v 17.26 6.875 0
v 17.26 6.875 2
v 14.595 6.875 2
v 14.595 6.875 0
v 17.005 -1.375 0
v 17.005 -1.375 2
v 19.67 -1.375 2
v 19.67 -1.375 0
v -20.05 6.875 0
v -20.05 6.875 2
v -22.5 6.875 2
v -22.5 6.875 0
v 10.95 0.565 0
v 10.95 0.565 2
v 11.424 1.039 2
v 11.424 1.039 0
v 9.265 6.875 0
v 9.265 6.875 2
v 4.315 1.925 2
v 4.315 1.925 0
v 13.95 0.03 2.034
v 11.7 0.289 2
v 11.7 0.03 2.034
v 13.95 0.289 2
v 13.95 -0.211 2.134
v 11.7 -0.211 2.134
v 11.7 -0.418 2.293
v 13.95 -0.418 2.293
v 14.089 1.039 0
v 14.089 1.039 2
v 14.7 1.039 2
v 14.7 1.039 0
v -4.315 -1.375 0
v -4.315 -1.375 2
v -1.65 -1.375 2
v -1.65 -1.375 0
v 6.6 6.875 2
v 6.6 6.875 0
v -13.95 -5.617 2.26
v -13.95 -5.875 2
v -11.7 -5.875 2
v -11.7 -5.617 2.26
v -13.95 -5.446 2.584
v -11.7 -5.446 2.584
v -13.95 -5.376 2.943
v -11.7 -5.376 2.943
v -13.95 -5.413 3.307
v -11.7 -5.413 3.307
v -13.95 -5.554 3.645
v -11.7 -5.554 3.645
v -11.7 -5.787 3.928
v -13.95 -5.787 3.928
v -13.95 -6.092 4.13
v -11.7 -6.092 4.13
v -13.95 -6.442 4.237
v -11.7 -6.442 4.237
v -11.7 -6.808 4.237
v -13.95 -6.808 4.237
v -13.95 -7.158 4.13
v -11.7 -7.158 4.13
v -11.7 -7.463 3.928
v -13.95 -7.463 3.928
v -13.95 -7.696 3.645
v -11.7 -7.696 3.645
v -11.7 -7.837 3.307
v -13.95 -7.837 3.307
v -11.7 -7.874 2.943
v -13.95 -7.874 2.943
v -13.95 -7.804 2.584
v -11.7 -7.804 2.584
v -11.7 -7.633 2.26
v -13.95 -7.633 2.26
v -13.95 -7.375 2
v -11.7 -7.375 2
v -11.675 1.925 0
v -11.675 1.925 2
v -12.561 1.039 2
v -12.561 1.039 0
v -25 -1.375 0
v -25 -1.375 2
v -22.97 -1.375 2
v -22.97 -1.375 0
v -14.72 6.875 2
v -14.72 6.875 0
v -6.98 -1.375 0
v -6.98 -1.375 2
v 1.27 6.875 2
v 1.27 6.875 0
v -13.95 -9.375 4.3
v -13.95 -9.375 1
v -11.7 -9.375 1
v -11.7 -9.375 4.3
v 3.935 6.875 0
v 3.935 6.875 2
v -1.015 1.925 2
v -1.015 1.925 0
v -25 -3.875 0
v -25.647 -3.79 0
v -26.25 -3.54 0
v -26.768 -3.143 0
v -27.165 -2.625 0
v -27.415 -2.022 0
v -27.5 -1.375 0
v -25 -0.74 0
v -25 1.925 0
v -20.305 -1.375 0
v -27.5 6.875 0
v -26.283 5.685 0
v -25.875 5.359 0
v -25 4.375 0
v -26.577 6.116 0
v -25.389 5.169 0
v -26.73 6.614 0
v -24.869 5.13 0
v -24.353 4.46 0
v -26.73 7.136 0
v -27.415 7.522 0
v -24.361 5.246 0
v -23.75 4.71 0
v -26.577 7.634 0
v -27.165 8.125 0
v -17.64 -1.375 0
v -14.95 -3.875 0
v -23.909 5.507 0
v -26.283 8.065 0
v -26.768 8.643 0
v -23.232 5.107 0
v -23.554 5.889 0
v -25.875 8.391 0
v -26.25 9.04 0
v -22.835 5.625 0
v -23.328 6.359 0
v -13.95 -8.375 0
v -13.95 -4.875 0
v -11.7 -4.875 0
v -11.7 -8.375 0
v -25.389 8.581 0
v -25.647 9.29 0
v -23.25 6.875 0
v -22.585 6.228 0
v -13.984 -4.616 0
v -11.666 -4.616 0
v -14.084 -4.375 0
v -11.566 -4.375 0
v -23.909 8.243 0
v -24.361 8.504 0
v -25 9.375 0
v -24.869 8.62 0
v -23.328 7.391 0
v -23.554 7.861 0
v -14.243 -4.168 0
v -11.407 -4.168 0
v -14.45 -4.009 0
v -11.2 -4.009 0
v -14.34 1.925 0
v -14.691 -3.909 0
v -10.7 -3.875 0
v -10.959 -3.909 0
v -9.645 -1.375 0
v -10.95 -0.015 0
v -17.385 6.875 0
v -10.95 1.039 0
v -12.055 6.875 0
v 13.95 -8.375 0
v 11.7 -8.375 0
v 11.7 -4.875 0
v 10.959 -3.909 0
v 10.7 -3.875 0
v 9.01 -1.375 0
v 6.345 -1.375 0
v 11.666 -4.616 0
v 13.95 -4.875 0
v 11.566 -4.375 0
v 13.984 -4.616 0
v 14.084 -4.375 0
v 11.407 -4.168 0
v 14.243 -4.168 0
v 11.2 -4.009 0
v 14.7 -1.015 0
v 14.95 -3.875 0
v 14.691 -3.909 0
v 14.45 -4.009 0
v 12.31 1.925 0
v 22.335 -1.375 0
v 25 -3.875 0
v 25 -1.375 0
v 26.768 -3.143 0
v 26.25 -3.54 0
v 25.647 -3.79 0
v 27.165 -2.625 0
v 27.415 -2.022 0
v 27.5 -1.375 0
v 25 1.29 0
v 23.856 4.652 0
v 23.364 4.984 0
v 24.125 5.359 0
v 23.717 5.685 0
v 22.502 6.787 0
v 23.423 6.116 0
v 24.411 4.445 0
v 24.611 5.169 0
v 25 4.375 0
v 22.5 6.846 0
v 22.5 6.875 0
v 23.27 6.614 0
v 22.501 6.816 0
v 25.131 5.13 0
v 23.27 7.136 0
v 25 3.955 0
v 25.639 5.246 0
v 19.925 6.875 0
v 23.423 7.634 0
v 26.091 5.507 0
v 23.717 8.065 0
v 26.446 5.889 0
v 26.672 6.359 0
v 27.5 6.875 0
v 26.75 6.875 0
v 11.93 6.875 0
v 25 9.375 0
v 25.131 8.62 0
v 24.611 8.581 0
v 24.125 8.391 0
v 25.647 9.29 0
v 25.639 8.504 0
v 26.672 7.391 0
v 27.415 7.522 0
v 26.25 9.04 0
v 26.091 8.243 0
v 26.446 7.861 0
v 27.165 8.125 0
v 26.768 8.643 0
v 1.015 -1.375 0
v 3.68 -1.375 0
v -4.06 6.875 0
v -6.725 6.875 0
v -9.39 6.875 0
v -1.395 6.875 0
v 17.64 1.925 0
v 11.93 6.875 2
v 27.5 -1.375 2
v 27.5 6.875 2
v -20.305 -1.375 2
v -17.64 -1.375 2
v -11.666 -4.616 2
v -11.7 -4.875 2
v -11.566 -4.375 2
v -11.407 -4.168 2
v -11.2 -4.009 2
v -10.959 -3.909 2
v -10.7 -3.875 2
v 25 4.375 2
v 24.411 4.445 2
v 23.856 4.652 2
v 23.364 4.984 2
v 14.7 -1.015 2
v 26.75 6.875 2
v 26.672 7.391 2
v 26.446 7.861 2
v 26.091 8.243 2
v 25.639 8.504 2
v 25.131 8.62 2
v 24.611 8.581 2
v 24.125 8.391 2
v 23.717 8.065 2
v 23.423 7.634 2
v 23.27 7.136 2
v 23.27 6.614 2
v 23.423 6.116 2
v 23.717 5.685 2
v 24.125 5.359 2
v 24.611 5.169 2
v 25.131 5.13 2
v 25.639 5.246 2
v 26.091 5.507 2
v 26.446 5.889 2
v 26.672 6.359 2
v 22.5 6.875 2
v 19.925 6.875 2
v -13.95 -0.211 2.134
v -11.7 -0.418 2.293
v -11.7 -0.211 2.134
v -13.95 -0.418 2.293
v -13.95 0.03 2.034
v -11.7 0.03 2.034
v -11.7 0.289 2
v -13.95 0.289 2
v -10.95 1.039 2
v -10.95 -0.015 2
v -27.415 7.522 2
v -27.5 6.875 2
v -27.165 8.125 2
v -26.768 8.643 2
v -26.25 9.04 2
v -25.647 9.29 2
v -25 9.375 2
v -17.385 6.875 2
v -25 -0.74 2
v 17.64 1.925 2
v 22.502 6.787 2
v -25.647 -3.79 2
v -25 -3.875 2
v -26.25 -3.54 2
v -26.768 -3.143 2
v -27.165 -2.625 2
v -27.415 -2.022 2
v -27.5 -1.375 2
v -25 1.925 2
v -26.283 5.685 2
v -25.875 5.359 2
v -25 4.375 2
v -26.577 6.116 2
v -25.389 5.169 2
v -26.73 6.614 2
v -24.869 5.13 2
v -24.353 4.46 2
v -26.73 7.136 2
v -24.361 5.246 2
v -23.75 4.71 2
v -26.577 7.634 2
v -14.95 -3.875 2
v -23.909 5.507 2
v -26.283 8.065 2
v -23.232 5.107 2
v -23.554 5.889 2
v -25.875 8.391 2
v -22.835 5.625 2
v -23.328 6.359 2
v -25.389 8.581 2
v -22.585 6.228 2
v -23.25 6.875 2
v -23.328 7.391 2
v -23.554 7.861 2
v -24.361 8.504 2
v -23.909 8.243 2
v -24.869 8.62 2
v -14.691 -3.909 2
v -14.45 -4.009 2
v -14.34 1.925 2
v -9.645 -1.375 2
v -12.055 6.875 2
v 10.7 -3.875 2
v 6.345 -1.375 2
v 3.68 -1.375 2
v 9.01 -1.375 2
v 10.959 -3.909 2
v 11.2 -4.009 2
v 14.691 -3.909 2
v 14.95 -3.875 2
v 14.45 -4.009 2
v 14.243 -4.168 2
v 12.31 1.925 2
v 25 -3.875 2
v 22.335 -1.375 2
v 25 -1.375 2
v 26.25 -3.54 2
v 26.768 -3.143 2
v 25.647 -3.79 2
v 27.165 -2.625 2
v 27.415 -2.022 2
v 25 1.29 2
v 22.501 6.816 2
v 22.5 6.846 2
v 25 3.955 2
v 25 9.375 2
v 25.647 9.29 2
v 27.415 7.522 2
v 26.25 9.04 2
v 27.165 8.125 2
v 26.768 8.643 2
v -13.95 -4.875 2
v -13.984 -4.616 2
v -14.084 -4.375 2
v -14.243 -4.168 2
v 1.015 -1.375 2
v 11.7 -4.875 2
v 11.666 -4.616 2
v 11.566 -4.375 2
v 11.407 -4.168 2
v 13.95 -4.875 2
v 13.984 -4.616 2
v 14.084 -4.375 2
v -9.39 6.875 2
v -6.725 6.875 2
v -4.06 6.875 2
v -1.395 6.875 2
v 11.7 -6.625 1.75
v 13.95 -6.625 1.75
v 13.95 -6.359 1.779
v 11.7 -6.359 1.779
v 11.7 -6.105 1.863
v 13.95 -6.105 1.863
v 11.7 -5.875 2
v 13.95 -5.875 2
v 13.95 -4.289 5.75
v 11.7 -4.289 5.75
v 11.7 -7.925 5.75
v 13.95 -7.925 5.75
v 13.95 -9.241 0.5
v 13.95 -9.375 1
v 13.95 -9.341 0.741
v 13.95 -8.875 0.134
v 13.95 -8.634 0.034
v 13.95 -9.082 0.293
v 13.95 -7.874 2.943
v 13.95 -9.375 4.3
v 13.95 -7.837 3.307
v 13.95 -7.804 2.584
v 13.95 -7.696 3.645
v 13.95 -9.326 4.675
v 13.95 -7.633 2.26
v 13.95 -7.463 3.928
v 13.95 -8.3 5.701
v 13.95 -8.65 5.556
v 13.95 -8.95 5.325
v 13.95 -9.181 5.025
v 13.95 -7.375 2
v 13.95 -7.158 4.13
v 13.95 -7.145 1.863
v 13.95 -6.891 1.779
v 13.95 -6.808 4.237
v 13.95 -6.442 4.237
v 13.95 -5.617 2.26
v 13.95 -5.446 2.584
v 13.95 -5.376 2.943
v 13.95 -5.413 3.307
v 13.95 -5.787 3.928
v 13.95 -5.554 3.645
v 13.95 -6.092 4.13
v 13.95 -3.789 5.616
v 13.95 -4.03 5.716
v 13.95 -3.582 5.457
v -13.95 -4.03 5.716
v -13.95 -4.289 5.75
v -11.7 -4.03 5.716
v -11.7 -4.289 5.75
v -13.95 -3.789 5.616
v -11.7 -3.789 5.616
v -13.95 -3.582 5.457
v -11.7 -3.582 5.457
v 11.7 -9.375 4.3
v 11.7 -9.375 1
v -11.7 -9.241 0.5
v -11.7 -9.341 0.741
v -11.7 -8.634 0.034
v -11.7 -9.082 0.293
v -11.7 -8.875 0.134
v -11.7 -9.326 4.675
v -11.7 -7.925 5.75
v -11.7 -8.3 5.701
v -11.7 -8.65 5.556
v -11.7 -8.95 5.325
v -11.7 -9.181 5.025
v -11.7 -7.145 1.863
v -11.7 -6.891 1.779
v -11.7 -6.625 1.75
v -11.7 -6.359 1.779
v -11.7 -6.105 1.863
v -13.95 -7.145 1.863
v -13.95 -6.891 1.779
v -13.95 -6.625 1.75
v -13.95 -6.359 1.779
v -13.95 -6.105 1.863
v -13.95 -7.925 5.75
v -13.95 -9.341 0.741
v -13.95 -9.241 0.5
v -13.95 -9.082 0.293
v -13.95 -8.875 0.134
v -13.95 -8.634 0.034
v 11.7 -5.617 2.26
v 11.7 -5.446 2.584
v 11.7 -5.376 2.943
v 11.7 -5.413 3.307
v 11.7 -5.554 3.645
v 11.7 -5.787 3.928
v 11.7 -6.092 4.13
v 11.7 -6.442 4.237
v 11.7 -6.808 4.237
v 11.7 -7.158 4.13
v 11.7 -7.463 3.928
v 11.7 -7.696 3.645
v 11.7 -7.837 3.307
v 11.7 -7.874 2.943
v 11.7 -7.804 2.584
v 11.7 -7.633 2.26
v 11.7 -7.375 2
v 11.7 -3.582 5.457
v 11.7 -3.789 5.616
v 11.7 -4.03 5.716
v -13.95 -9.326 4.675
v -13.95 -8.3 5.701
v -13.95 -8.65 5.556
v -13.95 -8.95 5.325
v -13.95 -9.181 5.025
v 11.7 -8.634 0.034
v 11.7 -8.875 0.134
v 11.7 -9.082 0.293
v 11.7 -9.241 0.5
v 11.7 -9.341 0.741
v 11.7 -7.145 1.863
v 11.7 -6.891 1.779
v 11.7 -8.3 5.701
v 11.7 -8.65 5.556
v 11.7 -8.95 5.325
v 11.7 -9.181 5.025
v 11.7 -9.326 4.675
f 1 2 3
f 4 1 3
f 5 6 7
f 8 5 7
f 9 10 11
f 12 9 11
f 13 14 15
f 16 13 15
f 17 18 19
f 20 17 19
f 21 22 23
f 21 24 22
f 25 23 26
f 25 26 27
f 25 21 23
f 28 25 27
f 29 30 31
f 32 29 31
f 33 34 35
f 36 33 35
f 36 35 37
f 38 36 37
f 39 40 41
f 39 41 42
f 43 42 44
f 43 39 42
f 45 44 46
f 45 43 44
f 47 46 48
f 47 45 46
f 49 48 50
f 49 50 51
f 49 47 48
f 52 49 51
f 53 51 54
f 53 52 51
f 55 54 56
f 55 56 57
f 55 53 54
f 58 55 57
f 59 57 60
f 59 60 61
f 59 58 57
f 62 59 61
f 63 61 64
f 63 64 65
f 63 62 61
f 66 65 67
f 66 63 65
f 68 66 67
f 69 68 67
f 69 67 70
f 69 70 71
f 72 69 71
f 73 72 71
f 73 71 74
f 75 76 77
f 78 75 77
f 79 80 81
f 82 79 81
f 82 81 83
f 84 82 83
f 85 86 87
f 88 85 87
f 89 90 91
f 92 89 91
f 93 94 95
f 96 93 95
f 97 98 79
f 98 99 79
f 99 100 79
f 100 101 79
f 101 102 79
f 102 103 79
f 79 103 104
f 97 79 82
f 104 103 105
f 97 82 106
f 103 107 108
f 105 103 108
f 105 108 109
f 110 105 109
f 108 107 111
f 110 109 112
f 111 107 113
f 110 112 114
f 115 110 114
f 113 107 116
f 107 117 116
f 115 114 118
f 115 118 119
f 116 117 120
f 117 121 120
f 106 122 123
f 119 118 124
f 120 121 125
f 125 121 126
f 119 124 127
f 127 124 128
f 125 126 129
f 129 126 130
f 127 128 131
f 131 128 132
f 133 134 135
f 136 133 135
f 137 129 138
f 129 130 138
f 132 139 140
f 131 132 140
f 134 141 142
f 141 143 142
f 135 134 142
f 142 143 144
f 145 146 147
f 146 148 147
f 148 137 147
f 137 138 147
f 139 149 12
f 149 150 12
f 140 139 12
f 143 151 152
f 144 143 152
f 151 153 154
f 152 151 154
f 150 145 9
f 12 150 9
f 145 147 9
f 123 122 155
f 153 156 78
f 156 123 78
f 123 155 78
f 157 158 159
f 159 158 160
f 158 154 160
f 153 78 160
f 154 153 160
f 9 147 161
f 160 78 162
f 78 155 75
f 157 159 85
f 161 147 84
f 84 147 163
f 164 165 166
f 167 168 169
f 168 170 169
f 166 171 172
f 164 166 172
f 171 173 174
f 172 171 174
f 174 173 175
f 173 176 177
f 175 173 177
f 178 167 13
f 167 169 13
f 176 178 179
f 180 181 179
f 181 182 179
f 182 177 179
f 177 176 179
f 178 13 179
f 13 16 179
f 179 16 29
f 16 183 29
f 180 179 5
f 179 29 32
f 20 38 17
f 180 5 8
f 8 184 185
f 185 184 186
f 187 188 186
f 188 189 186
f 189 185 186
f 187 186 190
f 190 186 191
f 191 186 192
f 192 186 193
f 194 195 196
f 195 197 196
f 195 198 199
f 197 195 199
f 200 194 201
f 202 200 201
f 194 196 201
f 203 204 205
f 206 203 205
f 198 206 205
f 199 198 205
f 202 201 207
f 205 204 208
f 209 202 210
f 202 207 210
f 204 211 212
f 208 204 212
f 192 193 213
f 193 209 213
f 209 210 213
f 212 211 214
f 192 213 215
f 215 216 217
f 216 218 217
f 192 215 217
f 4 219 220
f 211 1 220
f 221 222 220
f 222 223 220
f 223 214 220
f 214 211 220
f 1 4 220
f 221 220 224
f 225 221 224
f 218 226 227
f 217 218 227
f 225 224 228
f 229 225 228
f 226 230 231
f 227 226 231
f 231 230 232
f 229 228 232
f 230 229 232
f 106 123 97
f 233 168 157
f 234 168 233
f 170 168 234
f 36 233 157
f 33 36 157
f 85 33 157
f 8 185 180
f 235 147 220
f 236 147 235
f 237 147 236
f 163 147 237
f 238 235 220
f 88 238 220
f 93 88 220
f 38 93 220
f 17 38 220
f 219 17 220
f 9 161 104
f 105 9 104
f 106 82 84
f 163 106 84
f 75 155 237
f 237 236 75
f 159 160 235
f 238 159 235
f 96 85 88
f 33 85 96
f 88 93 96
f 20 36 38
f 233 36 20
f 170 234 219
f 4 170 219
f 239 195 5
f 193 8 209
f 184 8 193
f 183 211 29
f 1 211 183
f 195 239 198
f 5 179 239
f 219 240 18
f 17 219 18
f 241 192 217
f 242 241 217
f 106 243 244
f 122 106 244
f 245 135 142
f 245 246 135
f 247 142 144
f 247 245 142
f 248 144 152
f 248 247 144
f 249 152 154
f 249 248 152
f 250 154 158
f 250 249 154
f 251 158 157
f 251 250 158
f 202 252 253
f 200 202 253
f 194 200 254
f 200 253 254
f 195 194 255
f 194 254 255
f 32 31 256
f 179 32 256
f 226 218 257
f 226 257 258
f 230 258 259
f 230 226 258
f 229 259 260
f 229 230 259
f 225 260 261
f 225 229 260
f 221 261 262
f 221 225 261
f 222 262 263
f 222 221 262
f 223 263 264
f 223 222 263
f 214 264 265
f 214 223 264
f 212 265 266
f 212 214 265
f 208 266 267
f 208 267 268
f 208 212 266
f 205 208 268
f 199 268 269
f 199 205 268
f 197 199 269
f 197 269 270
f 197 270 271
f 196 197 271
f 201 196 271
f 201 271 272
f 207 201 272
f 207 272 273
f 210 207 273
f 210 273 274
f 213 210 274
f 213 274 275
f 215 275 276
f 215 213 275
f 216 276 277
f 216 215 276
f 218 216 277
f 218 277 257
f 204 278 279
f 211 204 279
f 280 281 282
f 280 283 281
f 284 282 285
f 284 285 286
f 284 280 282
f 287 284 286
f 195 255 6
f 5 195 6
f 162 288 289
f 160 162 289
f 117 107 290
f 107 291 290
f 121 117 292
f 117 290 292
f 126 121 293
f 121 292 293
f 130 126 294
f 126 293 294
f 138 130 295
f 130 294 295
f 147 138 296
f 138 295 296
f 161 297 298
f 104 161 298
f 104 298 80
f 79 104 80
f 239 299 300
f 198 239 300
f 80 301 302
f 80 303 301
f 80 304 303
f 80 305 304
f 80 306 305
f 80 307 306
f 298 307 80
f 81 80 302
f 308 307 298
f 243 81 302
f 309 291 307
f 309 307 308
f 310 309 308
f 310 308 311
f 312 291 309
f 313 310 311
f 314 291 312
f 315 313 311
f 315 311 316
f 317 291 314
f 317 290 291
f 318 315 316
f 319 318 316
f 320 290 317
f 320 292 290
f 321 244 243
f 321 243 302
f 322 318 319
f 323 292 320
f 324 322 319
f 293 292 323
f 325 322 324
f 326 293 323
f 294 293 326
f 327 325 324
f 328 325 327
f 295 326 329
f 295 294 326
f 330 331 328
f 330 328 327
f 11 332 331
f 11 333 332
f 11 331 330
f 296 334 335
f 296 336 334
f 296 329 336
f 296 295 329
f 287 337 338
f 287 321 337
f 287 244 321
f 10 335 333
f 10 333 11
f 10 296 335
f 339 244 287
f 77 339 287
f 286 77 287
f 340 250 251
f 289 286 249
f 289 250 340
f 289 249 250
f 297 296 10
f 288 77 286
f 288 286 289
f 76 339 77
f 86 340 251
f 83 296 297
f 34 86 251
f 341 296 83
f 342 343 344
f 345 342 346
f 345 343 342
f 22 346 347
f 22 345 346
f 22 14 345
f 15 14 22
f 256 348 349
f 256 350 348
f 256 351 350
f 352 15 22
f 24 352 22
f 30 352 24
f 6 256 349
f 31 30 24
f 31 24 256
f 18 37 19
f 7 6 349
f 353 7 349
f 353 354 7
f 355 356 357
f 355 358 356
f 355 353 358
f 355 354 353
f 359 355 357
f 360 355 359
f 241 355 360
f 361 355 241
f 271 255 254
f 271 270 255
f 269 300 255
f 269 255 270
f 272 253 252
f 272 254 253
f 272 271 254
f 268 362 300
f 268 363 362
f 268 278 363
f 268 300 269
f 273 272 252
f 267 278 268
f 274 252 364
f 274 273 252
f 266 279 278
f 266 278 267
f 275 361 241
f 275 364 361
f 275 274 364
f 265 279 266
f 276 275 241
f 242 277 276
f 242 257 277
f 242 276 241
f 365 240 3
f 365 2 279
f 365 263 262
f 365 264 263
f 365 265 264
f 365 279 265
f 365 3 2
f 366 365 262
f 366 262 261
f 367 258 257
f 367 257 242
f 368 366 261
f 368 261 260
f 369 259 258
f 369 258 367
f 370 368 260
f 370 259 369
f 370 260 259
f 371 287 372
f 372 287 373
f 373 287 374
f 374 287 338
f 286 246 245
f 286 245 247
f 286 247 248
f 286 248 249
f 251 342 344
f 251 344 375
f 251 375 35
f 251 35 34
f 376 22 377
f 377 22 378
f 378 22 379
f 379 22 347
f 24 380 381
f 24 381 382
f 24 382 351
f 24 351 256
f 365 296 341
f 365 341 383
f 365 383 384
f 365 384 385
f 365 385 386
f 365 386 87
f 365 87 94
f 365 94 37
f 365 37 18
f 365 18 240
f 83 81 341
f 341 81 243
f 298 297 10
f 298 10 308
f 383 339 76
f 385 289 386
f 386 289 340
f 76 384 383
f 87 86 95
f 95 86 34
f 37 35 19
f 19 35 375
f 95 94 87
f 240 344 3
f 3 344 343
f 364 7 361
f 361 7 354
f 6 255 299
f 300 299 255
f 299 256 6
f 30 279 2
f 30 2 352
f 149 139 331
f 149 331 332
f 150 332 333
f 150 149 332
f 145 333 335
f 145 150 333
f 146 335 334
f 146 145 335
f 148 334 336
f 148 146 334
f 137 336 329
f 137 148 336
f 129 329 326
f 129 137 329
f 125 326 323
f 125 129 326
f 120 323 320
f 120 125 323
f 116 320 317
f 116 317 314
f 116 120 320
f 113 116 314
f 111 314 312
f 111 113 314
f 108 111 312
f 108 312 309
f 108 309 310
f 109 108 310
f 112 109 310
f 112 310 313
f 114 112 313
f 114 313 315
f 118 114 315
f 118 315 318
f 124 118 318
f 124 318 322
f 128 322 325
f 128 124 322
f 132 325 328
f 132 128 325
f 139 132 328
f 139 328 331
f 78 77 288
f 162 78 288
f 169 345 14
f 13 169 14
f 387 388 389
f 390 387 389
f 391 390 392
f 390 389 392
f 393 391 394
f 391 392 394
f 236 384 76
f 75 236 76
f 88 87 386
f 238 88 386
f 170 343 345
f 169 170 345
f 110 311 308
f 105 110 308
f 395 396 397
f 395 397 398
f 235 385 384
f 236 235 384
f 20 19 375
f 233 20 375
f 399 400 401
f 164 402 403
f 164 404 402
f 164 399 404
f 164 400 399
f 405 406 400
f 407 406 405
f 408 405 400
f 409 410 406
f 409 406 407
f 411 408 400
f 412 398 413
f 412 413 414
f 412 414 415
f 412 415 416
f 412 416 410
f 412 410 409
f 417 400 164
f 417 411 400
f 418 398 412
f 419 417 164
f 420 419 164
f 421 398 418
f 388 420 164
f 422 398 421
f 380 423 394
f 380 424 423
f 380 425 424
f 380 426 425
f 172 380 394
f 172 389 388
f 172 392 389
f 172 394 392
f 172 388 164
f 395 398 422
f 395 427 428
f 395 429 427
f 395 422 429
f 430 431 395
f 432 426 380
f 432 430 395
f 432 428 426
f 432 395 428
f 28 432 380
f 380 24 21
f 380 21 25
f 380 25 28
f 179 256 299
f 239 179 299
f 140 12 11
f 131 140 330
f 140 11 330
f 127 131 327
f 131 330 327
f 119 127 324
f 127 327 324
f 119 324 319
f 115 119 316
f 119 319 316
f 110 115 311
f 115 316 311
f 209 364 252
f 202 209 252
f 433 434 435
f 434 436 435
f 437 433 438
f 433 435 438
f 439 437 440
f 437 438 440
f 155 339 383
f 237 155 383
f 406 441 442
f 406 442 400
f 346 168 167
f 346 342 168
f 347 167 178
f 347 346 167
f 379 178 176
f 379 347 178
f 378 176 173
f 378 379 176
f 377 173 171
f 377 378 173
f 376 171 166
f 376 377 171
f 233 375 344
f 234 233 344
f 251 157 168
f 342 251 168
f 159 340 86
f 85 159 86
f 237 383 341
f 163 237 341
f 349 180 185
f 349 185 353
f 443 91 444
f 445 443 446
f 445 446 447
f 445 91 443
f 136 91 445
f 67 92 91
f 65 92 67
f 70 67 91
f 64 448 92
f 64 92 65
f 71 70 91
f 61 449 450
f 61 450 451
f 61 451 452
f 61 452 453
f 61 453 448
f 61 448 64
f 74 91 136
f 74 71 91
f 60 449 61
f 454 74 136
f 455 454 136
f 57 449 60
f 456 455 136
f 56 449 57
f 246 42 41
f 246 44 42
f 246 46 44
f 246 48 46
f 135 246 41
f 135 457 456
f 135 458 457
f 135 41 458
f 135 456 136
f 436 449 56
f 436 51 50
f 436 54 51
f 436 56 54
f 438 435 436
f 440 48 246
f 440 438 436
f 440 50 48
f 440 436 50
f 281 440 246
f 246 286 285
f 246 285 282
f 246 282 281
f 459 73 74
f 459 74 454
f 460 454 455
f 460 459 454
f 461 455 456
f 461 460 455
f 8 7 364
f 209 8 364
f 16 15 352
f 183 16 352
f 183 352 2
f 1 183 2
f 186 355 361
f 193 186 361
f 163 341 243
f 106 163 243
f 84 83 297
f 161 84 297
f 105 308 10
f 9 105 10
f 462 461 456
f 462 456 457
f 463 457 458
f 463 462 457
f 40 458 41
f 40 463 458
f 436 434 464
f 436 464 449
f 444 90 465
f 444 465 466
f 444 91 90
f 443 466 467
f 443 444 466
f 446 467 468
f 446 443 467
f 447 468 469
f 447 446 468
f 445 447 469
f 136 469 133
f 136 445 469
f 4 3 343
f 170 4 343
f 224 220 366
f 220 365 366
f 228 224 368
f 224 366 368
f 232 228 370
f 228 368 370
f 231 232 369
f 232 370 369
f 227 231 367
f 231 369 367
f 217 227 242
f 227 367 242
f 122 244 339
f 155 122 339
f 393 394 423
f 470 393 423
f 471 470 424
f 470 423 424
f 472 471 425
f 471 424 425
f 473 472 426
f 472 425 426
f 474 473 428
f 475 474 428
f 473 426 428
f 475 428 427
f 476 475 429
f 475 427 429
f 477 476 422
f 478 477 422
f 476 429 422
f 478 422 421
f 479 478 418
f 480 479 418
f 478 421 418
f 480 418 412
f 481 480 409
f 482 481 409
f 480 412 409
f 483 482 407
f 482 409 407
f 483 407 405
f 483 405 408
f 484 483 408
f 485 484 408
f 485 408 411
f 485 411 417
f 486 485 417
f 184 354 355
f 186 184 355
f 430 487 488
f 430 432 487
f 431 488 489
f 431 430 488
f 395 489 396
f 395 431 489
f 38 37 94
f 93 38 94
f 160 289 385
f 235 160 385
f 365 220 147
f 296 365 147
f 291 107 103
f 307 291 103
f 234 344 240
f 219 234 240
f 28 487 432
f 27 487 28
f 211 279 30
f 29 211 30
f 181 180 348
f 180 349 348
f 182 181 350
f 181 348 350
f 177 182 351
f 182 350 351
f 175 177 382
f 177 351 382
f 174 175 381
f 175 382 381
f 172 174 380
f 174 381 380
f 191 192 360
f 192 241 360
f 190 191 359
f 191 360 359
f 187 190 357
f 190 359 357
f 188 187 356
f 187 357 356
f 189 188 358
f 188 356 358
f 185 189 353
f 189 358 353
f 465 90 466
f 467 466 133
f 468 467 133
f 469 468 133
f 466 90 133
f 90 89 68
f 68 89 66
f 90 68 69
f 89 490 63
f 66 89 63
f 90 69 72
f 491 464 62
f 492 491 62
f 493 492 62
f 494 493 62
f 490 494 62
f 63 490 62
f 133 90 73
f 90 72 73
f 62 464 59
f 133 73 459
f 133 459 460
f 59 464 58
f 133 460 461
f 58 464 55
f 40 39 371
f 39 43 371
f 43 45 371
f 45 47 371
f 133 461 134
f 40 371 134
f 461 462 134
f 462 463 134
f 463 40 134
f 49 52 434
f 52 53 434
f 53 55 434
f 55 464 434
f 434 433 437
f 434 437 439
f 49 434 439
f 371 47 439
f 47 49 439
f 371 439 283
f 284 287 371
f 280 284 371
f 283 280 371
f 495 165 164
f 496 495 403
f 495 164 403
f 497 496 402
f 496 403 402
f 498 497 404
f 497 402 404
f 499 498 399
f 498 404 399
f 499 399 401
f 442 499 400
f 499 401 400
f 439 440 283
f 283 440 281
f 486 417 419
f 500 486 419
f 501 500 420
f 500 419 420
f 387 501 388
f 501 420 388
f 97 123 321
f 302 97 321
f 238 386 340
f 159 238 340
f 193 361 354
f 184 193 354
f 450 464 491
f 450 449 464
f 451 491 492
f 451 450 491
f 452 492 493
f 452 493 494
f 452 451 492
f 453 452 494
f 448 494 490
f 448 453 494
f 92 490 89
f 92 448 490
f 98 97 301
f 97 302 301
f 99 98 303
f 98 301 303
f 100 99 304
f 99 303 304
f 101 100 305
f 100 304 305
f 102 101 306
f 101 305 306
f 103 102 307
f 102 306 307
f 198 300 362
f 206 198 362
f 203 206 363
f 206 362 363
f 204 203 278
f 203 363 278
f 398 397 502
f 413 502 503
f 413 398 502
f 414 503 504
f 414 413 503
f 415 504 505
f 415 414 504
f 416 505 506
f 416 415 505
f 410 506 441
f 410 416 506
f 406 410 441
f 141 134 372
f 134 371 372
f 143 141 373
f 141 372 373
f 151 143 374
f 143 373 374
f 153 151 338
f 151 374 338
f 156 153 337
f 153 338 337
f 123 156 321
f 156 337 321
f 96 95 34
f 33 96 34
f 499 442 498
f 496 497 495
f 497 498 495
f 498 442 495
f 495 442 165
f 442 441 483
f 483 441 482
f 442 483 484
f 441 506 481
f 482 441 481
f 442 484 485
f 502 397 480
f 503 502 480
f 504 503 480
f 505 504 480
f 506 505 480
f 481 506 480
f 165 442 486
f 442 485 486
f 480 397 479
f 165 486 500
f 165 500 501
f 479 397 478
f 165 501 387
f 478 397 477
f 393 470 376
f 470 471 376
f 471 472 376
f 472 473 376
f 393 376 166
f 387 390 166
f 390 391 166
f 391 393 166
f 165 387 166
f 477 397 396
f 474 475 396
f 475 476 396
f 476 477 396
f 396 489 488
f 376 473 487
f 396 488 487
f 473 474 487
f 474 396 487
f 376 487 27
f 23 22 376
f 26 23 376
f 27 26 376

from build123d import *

# Parameters (mm, degrees)
ESQUISSE1_R             = 1.75
BOSS_EXTRU_1_DEPTH      = 2
ESQUISSE1_3_W           = 2.25
ESQUISSE1_3_H           = 5.5
BOSS_EXTRU_3_DEPTH      = 5.75
ESQUISSE2_R             = 1.25
ESQUISSE2_W             = 3.75
ESQUISSE2_H             = 5.5
ENL_V_MAT_EXTRU_4_DEPTH = 13.55
ENL_V_MAT_EXTRU_5_REACH = 44.884
NERVURE1_REACH          = 44.884
ESQUISSE4_WALL_W        = 93.071724536
ESQUISSE4_WALL_H        = 2.25
CONG_1_R                = 1.45
CONG_2_R                = 1
ENL_V_MAT_EXTRU_6_REACH = 31.295
CONG_4_R                = 2.5


with BuildPart() as part:
    # Esquisse1 → Boss.-Extru.1 (new body)
    with BuildSketch(Plane.XY):
        Polygon((27.5, 9.375), (-27.5, 9.375), (-27.5, -9.375), (-13.95, -9.375), (-13.95, -3.875), (13.95, -3.875), (13.95, -9.375), (27.5, -9.375), align=None)
        with Locations((-25, 6.875)):
            Circle(ESQUISSE1_R, mode=Mode.SUBTRACT)
        with Locations((25, 6.875)):
            Circle(ESQUISSE1_R, mode=Mode.SUBTRACT)
    extrude(amount=BOSS_EXTRU_1_DEPTH)

    # Esquisse1_3 → Boss.-Extru.3 (add)
    with BuildSketch(Plane.XY):
        with Locations((-12.825, -6.625)):
            Rectangle(ESQUISSE1_3_W, ESQUISSE1_3_H)
        with Locations((12.825, -6.625)):
            Rectangle(ESQUISSE1_3_W, ESQUISSE1_3_H)
    extrude(amount=BOSS_EXTRU_3_DEPTH)

    # Esquisse2 → Enl_v. mat.-Extru.4 (cut)
    with BuildSketch(Plane(origin=(13.95, 0, 0), x_dir=(0, 0, -1), z_dir=(1, 0, 0))):
        with BuildLine():
            Line((-2, -5.875), (-2, -7.375))
            ThreePointArc((-2, -7.375), (-1.814145877, -7.020284708), (-1.75, -6.625))
            ThreePointArc((-1.75, -6.625), (-1.814145877, -6.229715292), (-2, -5.875))
        make_face()
        with BuildLine():
            ThreePointArc((-2, -5.875), (-4.25, -6.625), (-2, -7.375))
            Line((-2, -7.375), (-2, -5.875))
        make_face()
        with Locations((-3, -6.625)):
            Circle(ESQUISSE2_R)
        with Locations((-3.875, -6.625)):
            Rectangle(ESQUISSE2_W, ESQUISSE2_H)
        with BuildLine():
            Line((-2, -7.375), (-2, -9.375))
            Line((-2, -9.375), (0, -9.375))
            Line((0, -9.375), (0, -3.875))
            Line((0, -3.875), (-2, -3.875))
            Line((-2, -3.875), (-2, -5.875))
            ThreePointArc((-2, -5.875), (-1.814145877, -6.229715292), (-1.75, -6.625))
            ThreePointArc((-1.75, -6.625), (-1.814145877, -7.020284708), (-2, -7.375))
        make_face()
    enl_v_mat_extru_4 = extrude(amount=ENL_V_MAT_EXTRU_4_DEPTH, mode=Mode.SUBTRACT)

    # Esquisse2_5 → Enl_v. mat.-Extru.5 (cut, up to next)
    with BuildSketch(Plane(origin=(13.95, 0, 0), x_dir=(0, 0, -1), z_dir=(1, 0, 0)), mode=Mode.PRIVATE) as enl_v_mat_extru_5_sk1:
        with BuildLine():
            Line((-2, -5.875), (-2, -7.375))
            ThreePointArc((-2, -7.375), (-1.814145877, -7.020284708), (-1.75, -6.625))
            ThreePointArc((-1.75, -6.625), (-1.814145877, -6.229715292), (-2, -5.875))
        make_face()
    enl_v_mat_extru_5_tool1 = extrude(enl_v_mat_extru_5_sk1.sketch, amount=-ENL_V_MAT_EXTRU_5_REACH, mode=Mode.PRIVATE) & part.part
    # Esquisse2_5 → Enl_v. mat.-Extru.5 (cut, up to next)
    with BuildSketch(Plane(origin=(13.95, 0, 0), x_dir=(0, 0, -1), z_dir=(1, 0, 0)), mode=Mode.PRIVATE) as enl_v_mat_extru_5_sk2:
        with BuildLine():
            ThreePointArc((-2, -5.875), (-4.25, -6.625), (-2, -7.375))
            Line((-2, -7.375), (-2, -5.875))
        make_face()
    enl_v_mat_extru_5_tool2 = extrude(enl_v_mat_extru_5_sk2.sketch, amount=-ENL_V_MAT_EXTRU_5_REACH, mode=Mode.PRIVATE) & part.part
    # Esquisse2_5 → Enl_v. mat.-Extru.5 (cut, up to next)
    with BuildSketch(Plane(origin=(13.95, 0, 0), x_dir=(0, 0, -1), z_dir=(1, 0, 0)), mode=Mode.PRIVATE) as enl_v_mat_extru_5_sk3:
        with BuildLine():
            Line((-2, -5.875), (-2, -7.375))
            ThreePointArc((-2, -7.375), (-1.814145877, -7.020284708), (-1.75, -6.625))
            ThreePointArc((-1.75, -6.625), (-1.814145877, -6.229715292), (-2, -5.875))
        make_face()
    enl_v_mat_extru_5_tool3 = extrude(enl_v_mat_extru_5_sk3.sketch, amount=-ENL_V_MAT_EXTRU_5_REACH, mode=Mode.PRIVATE) & part.part
    # Esquisse2_5 → Enl_v. mat.-Extru.5 (cut, up to next)
    with BuildSketch(Plane(origin=(13.95, 0, 0), x_dir=(0, 0, -1), z_dir=(1, 0, 0)), mode=Mode.PRIVATE) as enl_v_mat_extru_5_sk4:
        with BuildLine():
            ThreePointArc((-2, -5.875), (-4.25, -6.625), (-2, -7.375))
            Line((-2, -7.375), (-2, -5.875))
        make_face()
    enl_v_mat_extru_5_tool4 = extrude(enl_v_mat_extru_5_sk4.sketch, amount=-ENL_V_MAT_EXTRU_5_REACH, mode=Mode.PRIVATE) & part.part
    enl_v_mat_extru_5_1 = enl_v_mat_extru_5_tool1.solids().sort_by_distance((13.95, -6.625, 1.89909))[0]
    add(enl_v_mat_extru_5_1, mode=Mode.SUBTRACT)
    enl_v_mat_extru_5_2 = enl_v_mat_extru_5_tool2.solids().sort_by_distance((13.95, -6.625, 3.060441))[0]
    add(enl_v_mat_extru_5_2, mode=Mode.SUBTRACT)
    enl_v_mat_extru_5_3 = enl_v_mat_extru_5_tool3.solids().sort_by_distance((13.95, -6.625, 1.89909))[0]
    add(enl_v_mat_extru_5_3, mode=Mode.SUBTRACT)
    enl_v_mat_extru_5_4 = enl_v_mat_extru_5_tool4.solids().sort_by_distance((13.95, -6.625, 3.060441))[0]
    add(enl_v_mat_extru_5_4, mode=Mode.SUBTRACT)
    enl_v_mat_extru_5 = enl_v_mat_extru_5_1 + enl_v_mat_extru_5_2 + enl_v_mat_extru_5_3 + enl_v_mat_extru_5_4  # Enl_v. mat.-Extru.5 as one shape, for the pattern or mirror that repeats it

    # Esquisse4 wall → Nervure1 (add, up to next)
    with BuildSketch(Plane(origin=(13.95, -2, 3.875), x_dir=(0, 0.707106781187, -0.707106781187), z_dir=(0, 0.707106781187, 0.707106781187)), mode=Mode.PRIVATE) as nervure1_sk1:
        with Locations((0, 1.125)):
            Rectangle(ESQUISSE4_WALL_W, ESQUISSE4_WALL_H)
    nervure1_tool1 = extrude(nervure1_sk1.sketch, amount=-NERVURE1_REACH, mode=Mode.PRIVATE) - part.part
    nervure1 = nervure1_tool1.solids().sort_by_distance((13.95, -2, 3.875))[0]
    add(nervure1)

    # Sym_trie2: Enl_v. mat.-Extru.4, Enl_v. mat.-Extru.5, Nervure1 across plane
    add(enl_v_mat_extru_4.mirror(Plane(origin=(0, 0, 0), x_dir=(0, 0, 1), z_dir=(1, 0, 0))), mode=Mode.SUBTRACT)
    add(enl_v_mat_extru_5.mirror(Plane(origin=(0, 0, 0), x_dir=(0, 0, 1), z_dir=(1, 0, 0))), mode=Mode.SUBTRACT)
    add(nervure1.mirror(Plane(origin=(0, 0, 0), x_dir=(0, 0, 1), z_dir=(1, 0, 0))))

    # Cong_1
    cong_1_edges = [part.edges().sort_by_distance(p)[0] for p in [
        (-12.825, -9.375, 5.75),
        (12.825, -9.375, 5.75),
    ]]
    fillet(cong_1_edges, radius=CONG_1_R)

    # Cong_2
    cong_2_edges = [part.edges().sort_by_distance(p)[0] for p in [
        (-12.825, -9.375, 0),
        (-13.95, -3.875, 1),
        (-12.825, -0.125, 2),
        (12.825, -9.375, 0),
        (-11.7, -3.875, 1),
        (-12.825, -3.875, 5.75),
        (12.825, -3.875, 5.75),
        (11.7, -3.875, 1),
        (13.95, -3.875, 1),
        (12.825, -0.125, 2),
    ]]
    fillet(cong_2_edges, radius=CONG_2_R)

    # Esquisse5 → Enl_v. mat.-Extru.6 (cut, up to next)
    with BuildSketch(Plane.XY.offset(2), mode=Mode.PRIVATE) as enl_v_mat_extru_6_sk1:
        with BuildLine():
            Line((-20.050252532, 6.875), (-22.5, 6.875))
            ThreePointArc((-22.5, 6.875), (-23.232233047, 5.107233047), (-25, 4.375))
            Line((-25, 4.375), (-25, 1.925252532))
            Line((-25, 1.925252532), (-20.050252532, 6.875))
        make_face()
    enl_v_mat_extru_6_tool1 = extrude(enl_v_mat_extru_6_sk1.sketch, amount=-ENL_V_MAT_EXTRU_6_REACH, mode=Mode.PRIVATE) & part.part
    # Esquisse5 → Enl_v. mat.-Extru.6 (cut, up to next)
    with BuildSketch(Plane.XY.offset(2), mode=Mode.PRIVATE) as enl_v_mat_extru_6_sk2:
        Polygon((-14.720227279, 6.875), (-17.385239905, 6.875), (-22.334987373, 1.925252532), (-25, -0.739760095), (-25, -1.375), (-22.970227279, -1.375), (-19.669974747, 1.925252532), align=None)
    enl_v_mat_extru_6_tool2 = extrude(enl_v_mat_extru_6_sk2.sketch, amount=-ENL_V_MAT_EXTRU_6_REACH, mode=Mode.PRIVATE) & part.part
    # Esquisse5 → Enl_v. mat.-Extru.6 (cut, up to next)
    with BuildSketch(Plane.XY.offset(2), mode=Mode.PRIVATE) as enl_v_mat_extru_6_sk3:
        Polygon((-9.390202025, 6.875), (-12.055214652, 6.875), (-17.00496212, 1.925252532), (-20.305214652, -1.375), (-17.640202025, -1.375), (-14.339949494, 1.925252532), align=None)
    enl_v_mat_extru_6_tool3 = extrude(enl_v_mat_extru_6_sk3.sketch, amount=-ENL_V_MAT_EXTRU_6_REACH, mode=Mode.PRIVATE) & part.part
    # Esquisse5 → Enl_v. mat.-Extru.6 (cut, up to next)
    with BuildSketch(Plane.XY.offset(2), mode=Mode.PRIVATE) as enl_v_mat_extru_6_sk4:
        Polygon((-4.060176772, 6.875), (-6.725189399, 6.875), (-11.674936867, 1.925252532), (-12.560975836, 1.039213562), (-10.95, 1.039213562), (-10.95, -0.014823228), (-9.00992424, 1.925252532), align=None)
    enl_v_mat_extru_6_tool4 = extrude(enl_v_mat_extru_6_sk4.sketch, amount=-ENL_V_MAT_EXTRU_6_REACH, mode=Mode.PRIVATE) & part.part
    # Esquisse5 → Enl_v. mat.-Extru.6 (cut, up to next)
    with BuildSketch(Plane.XY.offset(2), mode=Mode.PRIVATE) as enl_v_mat_extru_6_sk5:
        Polygon((1.269848481, 6.875), (-1.395164146, 6.875), (-6.344911614, 1.925252532), (-9.645164146, -1.375), (-6.980151519, -1.375), (-3.679898987, 1.925252532), align=None)
    enl_v_mat_extru_6_tool5 = extrude(enl_v_mat_extru_6_sk5.sketch, amount=-ENL_V_MAT_EXTRU_6_REACH, mode=Mode.PRIVATE) & part.part
    # Esquisse5 → Enl_v. mat.-Extru.6 (cut, up to next)
    with BuildSketch(Plane.XY.offset(2), mode=Mode.PRIVATE) as enl_v_mat_extru_6_sk6:
        Polygon((6.599873734, 6.875), (3.934861108, 6.875), (-1.014886361, 1.925252532), (-4.315138892, -1.375), (-1.650126266, -1.375), (1.650126266, 1.925252532), align=None)
    enl_v_mat_extru_6_tool6 = extrude(enl_v_mat_extru_6_sk6.sketch, amount=-ENL_V_MAT_EXTRU_6_REACH, mode=Mode.PRIVATE) & part.part
    # Esquisse5 → Enl_v. mat.-Extru.6 (cut, up to next)
    with BuildSketch(Plane.XY.offset(2), mode=Mode.PRIVATE) as enl_v_mat_extru_6_sk7:
        Polygon((11.929898987, 6.875), (9.264886361, 6.875), (4.315138892, 1.925252532), (1.014886361, -1.375), (3.679898987, -1.375), (6.980151519, 1.925252532), align=None)
    enl_v_mat_extru_6_tool7 = extrude(enl_v_mat_extru_6_sk7.sketch, amount=-ENL_V_MAT_EXTRU_6_REACH, mode=Mode.PRIVATE) & part.part
    # Esquisse5 → Enl_v. mat.-Extru.6 (cut, up to next)
    with BuildSketch(Plane.XY.offset(2), mode=Mode.PRIVATE) as enl_v_mat_extru_6_sk8:
        Polygon((17.25992424, 6.875), (14.594911614, 6.875), (9.645164146, 1.925252532), (6.344911614, -1.375), (9.00992424, -1.375), (10.95, 0.56507576), (10.95, 1.039213562), (11.424137803, 1.039213562), (12.310176772, 1.925252532), align=None)
    enl_v_mat_extru_6_tool8 = extrude(enl_v_mat_extru_6_sk8.sketch, amount=-ENL_V_MAT_EXTRU_6_REACH, mode=Mode.PRIVATE) & part.part
    # Esquisse5 → Enl_v. mat.-Extru.6 (cut, up to next)
    with BuildSketch(Plane.XY.offset(2), mode=Mode.PRIVATE) as enl_v_mat_extru_6_sk9:
        Polygon((10.95, 0.56507576), (11.424137803, 1.039213562), (10.95, 1.039213562), align=None)
    enl_v_mat_extru_6_tool9 = extrude(enl_v_mat_extru_6_sk9.sketch, amount=-ENL_V_MAT_EXTRU_6_REACH, mode=Mode.PRIVATE) & part.part
    # Esquisse5 → Enl_v. mat.-Extru.6 (cut, up to next)
    with BuildSketch(Plane.XY.offset(2), mode=Mode.PRIVATE) as enl_v_mat_extru_6_sk10:
        with BuildLine():
            Line((22.5, 6.875), (19.924936867, 6.875))
            Line((19.924936867, 6.875), (14.975189399, 1.925252532))
            Line((14.975189399, 1.925252532), (14.089150429, 1.039213562))
            Line((14.089150429, 1.039213562), (14.7, 1.039213562))
            Line((14.7, 1.039213562), (14.7, -1.014949494))
            Line((14.7, -1.014949494), (17.640202025, 1.925252532))
            Line((17.640202025, 1.925252532), (22.501562926, 6.786613432))
            ThreePointArc((22.501562926, 6.786613432), (22.500390762, 6.830799807), (22.5, 6.875))
        make_face()
    enl_v_mat_extru_6_tool10 = extrude(enl_v_mat_extru_6_sk10.sketch, amount=-ENL_V_MAT_EXTRU_6_REACH, mode=Mode.PRIVATE) & part.part
    # Esquisse5 → Enl_v. mat.-Extru.6 (cut, up to next)
    with BuildSketch(Plane.XY.offset(2), mode=Mode.PRIVATE) as enl_v_mat_extru_6_sk11:
        with BuildLine():
            ThreePointArc((25, 4.375), (24.127249624, 4.532286449), (23.364316695, 4.984354575))
            Line((23.364316695, 4.984354575), (20.305214652, 1.925252532))
            Line((20.305214652, 1.925252532), (17.00496212, -1.375))
            Line((17.00496212, -1.375), (19.669974747, -1.375))
            Line((19.669974747, -1.375), (22.970227279, 1.925252532))
            Line((22.970227279, 1.925252532), (25, 3.955025253))
            Line((25, 3.955025253), (25, 4.375))
        make_face()
    enl_v_mat_extru_6_tool11 = extrude(enl_v_mat_extru_6_sk11.sketch, amount=-ENL_V_MAT_EXTRU_6_REACH, mode=Mode.PRIVATE) & part.part
    # Esquisse5 → Enl_v. mat.-Extru.6 (cut, up to next)
    with BuildSketch(Plane.XY.offset(2), mode=Mode.PRIVATE) as enl_v_mat_extru_6_sk12:
        Polygon((25, -1.375), (25, 1.290012627), (22.334987373, -1.375), align=None)
    enl_v_mat_extru_6_tool12 = extrude(enl_v_mat_extru_6_sk12.sketch, amount=-ENL_V_MAT_EXTRU_6_REACH, mode=Mode.PRIVATE) & part.part
    add(enl_v_mat_extru_6_tool1.solids().sort_by_distance((-22.956327, 4.831327, 2))[0], mode=Mode.SUBTRACT)
    add(enl_v_mat_extru_6_tool2.solids().sort_by_distance((-20.131109, 2.786244, 2))[0], mode=Mode.SUBTRACT)
    add(enl_v_mat_extru_6_tool3.solids().sort_by_distance((-14.847708, 2.75, 2))[0], mode=Mode.SUBTRACT)
    add(enl_v_mat_extru_6_tool4.solids().sort_by_distance((-8.389483, 3.844364, 2))[0], mode=Mode.SUBTRACT)
    add(enl_v_mat_extru_6_tool5.solids().sort_by_distance((-4.187658, 2.75, 2))[0], mode=Mode.SUBTRACT)
    add(enl_v_mat_extru_6_tool6.solids().sort_by_distance((1.142367, 2.75, 2))[0], mode=Mode.SUBTRACT)
    add(enl_v_mat_extru_6_tool7.solids().sort_by_distance((6.472393, 2.75, 2))[0], mode=Mode.SUBTRACT)
    add(enl_v_mat_extru_6_tool8.solids().sort_by_distance((11.805986, 2.759603, 2))[0], mode=Mode.SUBTRACT)
    add(enl_v_mat_extru_6_tool9.solids().sort_by_distance((11.108046, 0.881168, 2))[0], mode=Mode.SUBTRACT)
    add(enl_v_mat_extru_6_tool10.solids().sort_by_distance((17.98556, 3.526015, 2))[0], mode=Mode.SUBTRACT)
    add(enl_v_mat_extru_6_tool11.solids().sort_by_distance((21.26436, 1.581944, 2))[0], mode=Mode.SUBTRACT)
    add(enl_v_mat_extru_6_tool12.solids().sort_by_distance((24.111662, -0.486662, 2))[0], mode=Mode.SUBTRACT)

    # Cong_4
    cong_4_edges = [part.edges().sort_by_distance(p)[0] for p in [
        (-27.5, -3.875, 1),
        (-27.5, 9.375, 1),
        (27.5, 9.375, 1),
        (27.5, -3.875, 1),
    ]]
    fillet(cong_4_edges, radius=CONG_4_R)


solid = part.part
